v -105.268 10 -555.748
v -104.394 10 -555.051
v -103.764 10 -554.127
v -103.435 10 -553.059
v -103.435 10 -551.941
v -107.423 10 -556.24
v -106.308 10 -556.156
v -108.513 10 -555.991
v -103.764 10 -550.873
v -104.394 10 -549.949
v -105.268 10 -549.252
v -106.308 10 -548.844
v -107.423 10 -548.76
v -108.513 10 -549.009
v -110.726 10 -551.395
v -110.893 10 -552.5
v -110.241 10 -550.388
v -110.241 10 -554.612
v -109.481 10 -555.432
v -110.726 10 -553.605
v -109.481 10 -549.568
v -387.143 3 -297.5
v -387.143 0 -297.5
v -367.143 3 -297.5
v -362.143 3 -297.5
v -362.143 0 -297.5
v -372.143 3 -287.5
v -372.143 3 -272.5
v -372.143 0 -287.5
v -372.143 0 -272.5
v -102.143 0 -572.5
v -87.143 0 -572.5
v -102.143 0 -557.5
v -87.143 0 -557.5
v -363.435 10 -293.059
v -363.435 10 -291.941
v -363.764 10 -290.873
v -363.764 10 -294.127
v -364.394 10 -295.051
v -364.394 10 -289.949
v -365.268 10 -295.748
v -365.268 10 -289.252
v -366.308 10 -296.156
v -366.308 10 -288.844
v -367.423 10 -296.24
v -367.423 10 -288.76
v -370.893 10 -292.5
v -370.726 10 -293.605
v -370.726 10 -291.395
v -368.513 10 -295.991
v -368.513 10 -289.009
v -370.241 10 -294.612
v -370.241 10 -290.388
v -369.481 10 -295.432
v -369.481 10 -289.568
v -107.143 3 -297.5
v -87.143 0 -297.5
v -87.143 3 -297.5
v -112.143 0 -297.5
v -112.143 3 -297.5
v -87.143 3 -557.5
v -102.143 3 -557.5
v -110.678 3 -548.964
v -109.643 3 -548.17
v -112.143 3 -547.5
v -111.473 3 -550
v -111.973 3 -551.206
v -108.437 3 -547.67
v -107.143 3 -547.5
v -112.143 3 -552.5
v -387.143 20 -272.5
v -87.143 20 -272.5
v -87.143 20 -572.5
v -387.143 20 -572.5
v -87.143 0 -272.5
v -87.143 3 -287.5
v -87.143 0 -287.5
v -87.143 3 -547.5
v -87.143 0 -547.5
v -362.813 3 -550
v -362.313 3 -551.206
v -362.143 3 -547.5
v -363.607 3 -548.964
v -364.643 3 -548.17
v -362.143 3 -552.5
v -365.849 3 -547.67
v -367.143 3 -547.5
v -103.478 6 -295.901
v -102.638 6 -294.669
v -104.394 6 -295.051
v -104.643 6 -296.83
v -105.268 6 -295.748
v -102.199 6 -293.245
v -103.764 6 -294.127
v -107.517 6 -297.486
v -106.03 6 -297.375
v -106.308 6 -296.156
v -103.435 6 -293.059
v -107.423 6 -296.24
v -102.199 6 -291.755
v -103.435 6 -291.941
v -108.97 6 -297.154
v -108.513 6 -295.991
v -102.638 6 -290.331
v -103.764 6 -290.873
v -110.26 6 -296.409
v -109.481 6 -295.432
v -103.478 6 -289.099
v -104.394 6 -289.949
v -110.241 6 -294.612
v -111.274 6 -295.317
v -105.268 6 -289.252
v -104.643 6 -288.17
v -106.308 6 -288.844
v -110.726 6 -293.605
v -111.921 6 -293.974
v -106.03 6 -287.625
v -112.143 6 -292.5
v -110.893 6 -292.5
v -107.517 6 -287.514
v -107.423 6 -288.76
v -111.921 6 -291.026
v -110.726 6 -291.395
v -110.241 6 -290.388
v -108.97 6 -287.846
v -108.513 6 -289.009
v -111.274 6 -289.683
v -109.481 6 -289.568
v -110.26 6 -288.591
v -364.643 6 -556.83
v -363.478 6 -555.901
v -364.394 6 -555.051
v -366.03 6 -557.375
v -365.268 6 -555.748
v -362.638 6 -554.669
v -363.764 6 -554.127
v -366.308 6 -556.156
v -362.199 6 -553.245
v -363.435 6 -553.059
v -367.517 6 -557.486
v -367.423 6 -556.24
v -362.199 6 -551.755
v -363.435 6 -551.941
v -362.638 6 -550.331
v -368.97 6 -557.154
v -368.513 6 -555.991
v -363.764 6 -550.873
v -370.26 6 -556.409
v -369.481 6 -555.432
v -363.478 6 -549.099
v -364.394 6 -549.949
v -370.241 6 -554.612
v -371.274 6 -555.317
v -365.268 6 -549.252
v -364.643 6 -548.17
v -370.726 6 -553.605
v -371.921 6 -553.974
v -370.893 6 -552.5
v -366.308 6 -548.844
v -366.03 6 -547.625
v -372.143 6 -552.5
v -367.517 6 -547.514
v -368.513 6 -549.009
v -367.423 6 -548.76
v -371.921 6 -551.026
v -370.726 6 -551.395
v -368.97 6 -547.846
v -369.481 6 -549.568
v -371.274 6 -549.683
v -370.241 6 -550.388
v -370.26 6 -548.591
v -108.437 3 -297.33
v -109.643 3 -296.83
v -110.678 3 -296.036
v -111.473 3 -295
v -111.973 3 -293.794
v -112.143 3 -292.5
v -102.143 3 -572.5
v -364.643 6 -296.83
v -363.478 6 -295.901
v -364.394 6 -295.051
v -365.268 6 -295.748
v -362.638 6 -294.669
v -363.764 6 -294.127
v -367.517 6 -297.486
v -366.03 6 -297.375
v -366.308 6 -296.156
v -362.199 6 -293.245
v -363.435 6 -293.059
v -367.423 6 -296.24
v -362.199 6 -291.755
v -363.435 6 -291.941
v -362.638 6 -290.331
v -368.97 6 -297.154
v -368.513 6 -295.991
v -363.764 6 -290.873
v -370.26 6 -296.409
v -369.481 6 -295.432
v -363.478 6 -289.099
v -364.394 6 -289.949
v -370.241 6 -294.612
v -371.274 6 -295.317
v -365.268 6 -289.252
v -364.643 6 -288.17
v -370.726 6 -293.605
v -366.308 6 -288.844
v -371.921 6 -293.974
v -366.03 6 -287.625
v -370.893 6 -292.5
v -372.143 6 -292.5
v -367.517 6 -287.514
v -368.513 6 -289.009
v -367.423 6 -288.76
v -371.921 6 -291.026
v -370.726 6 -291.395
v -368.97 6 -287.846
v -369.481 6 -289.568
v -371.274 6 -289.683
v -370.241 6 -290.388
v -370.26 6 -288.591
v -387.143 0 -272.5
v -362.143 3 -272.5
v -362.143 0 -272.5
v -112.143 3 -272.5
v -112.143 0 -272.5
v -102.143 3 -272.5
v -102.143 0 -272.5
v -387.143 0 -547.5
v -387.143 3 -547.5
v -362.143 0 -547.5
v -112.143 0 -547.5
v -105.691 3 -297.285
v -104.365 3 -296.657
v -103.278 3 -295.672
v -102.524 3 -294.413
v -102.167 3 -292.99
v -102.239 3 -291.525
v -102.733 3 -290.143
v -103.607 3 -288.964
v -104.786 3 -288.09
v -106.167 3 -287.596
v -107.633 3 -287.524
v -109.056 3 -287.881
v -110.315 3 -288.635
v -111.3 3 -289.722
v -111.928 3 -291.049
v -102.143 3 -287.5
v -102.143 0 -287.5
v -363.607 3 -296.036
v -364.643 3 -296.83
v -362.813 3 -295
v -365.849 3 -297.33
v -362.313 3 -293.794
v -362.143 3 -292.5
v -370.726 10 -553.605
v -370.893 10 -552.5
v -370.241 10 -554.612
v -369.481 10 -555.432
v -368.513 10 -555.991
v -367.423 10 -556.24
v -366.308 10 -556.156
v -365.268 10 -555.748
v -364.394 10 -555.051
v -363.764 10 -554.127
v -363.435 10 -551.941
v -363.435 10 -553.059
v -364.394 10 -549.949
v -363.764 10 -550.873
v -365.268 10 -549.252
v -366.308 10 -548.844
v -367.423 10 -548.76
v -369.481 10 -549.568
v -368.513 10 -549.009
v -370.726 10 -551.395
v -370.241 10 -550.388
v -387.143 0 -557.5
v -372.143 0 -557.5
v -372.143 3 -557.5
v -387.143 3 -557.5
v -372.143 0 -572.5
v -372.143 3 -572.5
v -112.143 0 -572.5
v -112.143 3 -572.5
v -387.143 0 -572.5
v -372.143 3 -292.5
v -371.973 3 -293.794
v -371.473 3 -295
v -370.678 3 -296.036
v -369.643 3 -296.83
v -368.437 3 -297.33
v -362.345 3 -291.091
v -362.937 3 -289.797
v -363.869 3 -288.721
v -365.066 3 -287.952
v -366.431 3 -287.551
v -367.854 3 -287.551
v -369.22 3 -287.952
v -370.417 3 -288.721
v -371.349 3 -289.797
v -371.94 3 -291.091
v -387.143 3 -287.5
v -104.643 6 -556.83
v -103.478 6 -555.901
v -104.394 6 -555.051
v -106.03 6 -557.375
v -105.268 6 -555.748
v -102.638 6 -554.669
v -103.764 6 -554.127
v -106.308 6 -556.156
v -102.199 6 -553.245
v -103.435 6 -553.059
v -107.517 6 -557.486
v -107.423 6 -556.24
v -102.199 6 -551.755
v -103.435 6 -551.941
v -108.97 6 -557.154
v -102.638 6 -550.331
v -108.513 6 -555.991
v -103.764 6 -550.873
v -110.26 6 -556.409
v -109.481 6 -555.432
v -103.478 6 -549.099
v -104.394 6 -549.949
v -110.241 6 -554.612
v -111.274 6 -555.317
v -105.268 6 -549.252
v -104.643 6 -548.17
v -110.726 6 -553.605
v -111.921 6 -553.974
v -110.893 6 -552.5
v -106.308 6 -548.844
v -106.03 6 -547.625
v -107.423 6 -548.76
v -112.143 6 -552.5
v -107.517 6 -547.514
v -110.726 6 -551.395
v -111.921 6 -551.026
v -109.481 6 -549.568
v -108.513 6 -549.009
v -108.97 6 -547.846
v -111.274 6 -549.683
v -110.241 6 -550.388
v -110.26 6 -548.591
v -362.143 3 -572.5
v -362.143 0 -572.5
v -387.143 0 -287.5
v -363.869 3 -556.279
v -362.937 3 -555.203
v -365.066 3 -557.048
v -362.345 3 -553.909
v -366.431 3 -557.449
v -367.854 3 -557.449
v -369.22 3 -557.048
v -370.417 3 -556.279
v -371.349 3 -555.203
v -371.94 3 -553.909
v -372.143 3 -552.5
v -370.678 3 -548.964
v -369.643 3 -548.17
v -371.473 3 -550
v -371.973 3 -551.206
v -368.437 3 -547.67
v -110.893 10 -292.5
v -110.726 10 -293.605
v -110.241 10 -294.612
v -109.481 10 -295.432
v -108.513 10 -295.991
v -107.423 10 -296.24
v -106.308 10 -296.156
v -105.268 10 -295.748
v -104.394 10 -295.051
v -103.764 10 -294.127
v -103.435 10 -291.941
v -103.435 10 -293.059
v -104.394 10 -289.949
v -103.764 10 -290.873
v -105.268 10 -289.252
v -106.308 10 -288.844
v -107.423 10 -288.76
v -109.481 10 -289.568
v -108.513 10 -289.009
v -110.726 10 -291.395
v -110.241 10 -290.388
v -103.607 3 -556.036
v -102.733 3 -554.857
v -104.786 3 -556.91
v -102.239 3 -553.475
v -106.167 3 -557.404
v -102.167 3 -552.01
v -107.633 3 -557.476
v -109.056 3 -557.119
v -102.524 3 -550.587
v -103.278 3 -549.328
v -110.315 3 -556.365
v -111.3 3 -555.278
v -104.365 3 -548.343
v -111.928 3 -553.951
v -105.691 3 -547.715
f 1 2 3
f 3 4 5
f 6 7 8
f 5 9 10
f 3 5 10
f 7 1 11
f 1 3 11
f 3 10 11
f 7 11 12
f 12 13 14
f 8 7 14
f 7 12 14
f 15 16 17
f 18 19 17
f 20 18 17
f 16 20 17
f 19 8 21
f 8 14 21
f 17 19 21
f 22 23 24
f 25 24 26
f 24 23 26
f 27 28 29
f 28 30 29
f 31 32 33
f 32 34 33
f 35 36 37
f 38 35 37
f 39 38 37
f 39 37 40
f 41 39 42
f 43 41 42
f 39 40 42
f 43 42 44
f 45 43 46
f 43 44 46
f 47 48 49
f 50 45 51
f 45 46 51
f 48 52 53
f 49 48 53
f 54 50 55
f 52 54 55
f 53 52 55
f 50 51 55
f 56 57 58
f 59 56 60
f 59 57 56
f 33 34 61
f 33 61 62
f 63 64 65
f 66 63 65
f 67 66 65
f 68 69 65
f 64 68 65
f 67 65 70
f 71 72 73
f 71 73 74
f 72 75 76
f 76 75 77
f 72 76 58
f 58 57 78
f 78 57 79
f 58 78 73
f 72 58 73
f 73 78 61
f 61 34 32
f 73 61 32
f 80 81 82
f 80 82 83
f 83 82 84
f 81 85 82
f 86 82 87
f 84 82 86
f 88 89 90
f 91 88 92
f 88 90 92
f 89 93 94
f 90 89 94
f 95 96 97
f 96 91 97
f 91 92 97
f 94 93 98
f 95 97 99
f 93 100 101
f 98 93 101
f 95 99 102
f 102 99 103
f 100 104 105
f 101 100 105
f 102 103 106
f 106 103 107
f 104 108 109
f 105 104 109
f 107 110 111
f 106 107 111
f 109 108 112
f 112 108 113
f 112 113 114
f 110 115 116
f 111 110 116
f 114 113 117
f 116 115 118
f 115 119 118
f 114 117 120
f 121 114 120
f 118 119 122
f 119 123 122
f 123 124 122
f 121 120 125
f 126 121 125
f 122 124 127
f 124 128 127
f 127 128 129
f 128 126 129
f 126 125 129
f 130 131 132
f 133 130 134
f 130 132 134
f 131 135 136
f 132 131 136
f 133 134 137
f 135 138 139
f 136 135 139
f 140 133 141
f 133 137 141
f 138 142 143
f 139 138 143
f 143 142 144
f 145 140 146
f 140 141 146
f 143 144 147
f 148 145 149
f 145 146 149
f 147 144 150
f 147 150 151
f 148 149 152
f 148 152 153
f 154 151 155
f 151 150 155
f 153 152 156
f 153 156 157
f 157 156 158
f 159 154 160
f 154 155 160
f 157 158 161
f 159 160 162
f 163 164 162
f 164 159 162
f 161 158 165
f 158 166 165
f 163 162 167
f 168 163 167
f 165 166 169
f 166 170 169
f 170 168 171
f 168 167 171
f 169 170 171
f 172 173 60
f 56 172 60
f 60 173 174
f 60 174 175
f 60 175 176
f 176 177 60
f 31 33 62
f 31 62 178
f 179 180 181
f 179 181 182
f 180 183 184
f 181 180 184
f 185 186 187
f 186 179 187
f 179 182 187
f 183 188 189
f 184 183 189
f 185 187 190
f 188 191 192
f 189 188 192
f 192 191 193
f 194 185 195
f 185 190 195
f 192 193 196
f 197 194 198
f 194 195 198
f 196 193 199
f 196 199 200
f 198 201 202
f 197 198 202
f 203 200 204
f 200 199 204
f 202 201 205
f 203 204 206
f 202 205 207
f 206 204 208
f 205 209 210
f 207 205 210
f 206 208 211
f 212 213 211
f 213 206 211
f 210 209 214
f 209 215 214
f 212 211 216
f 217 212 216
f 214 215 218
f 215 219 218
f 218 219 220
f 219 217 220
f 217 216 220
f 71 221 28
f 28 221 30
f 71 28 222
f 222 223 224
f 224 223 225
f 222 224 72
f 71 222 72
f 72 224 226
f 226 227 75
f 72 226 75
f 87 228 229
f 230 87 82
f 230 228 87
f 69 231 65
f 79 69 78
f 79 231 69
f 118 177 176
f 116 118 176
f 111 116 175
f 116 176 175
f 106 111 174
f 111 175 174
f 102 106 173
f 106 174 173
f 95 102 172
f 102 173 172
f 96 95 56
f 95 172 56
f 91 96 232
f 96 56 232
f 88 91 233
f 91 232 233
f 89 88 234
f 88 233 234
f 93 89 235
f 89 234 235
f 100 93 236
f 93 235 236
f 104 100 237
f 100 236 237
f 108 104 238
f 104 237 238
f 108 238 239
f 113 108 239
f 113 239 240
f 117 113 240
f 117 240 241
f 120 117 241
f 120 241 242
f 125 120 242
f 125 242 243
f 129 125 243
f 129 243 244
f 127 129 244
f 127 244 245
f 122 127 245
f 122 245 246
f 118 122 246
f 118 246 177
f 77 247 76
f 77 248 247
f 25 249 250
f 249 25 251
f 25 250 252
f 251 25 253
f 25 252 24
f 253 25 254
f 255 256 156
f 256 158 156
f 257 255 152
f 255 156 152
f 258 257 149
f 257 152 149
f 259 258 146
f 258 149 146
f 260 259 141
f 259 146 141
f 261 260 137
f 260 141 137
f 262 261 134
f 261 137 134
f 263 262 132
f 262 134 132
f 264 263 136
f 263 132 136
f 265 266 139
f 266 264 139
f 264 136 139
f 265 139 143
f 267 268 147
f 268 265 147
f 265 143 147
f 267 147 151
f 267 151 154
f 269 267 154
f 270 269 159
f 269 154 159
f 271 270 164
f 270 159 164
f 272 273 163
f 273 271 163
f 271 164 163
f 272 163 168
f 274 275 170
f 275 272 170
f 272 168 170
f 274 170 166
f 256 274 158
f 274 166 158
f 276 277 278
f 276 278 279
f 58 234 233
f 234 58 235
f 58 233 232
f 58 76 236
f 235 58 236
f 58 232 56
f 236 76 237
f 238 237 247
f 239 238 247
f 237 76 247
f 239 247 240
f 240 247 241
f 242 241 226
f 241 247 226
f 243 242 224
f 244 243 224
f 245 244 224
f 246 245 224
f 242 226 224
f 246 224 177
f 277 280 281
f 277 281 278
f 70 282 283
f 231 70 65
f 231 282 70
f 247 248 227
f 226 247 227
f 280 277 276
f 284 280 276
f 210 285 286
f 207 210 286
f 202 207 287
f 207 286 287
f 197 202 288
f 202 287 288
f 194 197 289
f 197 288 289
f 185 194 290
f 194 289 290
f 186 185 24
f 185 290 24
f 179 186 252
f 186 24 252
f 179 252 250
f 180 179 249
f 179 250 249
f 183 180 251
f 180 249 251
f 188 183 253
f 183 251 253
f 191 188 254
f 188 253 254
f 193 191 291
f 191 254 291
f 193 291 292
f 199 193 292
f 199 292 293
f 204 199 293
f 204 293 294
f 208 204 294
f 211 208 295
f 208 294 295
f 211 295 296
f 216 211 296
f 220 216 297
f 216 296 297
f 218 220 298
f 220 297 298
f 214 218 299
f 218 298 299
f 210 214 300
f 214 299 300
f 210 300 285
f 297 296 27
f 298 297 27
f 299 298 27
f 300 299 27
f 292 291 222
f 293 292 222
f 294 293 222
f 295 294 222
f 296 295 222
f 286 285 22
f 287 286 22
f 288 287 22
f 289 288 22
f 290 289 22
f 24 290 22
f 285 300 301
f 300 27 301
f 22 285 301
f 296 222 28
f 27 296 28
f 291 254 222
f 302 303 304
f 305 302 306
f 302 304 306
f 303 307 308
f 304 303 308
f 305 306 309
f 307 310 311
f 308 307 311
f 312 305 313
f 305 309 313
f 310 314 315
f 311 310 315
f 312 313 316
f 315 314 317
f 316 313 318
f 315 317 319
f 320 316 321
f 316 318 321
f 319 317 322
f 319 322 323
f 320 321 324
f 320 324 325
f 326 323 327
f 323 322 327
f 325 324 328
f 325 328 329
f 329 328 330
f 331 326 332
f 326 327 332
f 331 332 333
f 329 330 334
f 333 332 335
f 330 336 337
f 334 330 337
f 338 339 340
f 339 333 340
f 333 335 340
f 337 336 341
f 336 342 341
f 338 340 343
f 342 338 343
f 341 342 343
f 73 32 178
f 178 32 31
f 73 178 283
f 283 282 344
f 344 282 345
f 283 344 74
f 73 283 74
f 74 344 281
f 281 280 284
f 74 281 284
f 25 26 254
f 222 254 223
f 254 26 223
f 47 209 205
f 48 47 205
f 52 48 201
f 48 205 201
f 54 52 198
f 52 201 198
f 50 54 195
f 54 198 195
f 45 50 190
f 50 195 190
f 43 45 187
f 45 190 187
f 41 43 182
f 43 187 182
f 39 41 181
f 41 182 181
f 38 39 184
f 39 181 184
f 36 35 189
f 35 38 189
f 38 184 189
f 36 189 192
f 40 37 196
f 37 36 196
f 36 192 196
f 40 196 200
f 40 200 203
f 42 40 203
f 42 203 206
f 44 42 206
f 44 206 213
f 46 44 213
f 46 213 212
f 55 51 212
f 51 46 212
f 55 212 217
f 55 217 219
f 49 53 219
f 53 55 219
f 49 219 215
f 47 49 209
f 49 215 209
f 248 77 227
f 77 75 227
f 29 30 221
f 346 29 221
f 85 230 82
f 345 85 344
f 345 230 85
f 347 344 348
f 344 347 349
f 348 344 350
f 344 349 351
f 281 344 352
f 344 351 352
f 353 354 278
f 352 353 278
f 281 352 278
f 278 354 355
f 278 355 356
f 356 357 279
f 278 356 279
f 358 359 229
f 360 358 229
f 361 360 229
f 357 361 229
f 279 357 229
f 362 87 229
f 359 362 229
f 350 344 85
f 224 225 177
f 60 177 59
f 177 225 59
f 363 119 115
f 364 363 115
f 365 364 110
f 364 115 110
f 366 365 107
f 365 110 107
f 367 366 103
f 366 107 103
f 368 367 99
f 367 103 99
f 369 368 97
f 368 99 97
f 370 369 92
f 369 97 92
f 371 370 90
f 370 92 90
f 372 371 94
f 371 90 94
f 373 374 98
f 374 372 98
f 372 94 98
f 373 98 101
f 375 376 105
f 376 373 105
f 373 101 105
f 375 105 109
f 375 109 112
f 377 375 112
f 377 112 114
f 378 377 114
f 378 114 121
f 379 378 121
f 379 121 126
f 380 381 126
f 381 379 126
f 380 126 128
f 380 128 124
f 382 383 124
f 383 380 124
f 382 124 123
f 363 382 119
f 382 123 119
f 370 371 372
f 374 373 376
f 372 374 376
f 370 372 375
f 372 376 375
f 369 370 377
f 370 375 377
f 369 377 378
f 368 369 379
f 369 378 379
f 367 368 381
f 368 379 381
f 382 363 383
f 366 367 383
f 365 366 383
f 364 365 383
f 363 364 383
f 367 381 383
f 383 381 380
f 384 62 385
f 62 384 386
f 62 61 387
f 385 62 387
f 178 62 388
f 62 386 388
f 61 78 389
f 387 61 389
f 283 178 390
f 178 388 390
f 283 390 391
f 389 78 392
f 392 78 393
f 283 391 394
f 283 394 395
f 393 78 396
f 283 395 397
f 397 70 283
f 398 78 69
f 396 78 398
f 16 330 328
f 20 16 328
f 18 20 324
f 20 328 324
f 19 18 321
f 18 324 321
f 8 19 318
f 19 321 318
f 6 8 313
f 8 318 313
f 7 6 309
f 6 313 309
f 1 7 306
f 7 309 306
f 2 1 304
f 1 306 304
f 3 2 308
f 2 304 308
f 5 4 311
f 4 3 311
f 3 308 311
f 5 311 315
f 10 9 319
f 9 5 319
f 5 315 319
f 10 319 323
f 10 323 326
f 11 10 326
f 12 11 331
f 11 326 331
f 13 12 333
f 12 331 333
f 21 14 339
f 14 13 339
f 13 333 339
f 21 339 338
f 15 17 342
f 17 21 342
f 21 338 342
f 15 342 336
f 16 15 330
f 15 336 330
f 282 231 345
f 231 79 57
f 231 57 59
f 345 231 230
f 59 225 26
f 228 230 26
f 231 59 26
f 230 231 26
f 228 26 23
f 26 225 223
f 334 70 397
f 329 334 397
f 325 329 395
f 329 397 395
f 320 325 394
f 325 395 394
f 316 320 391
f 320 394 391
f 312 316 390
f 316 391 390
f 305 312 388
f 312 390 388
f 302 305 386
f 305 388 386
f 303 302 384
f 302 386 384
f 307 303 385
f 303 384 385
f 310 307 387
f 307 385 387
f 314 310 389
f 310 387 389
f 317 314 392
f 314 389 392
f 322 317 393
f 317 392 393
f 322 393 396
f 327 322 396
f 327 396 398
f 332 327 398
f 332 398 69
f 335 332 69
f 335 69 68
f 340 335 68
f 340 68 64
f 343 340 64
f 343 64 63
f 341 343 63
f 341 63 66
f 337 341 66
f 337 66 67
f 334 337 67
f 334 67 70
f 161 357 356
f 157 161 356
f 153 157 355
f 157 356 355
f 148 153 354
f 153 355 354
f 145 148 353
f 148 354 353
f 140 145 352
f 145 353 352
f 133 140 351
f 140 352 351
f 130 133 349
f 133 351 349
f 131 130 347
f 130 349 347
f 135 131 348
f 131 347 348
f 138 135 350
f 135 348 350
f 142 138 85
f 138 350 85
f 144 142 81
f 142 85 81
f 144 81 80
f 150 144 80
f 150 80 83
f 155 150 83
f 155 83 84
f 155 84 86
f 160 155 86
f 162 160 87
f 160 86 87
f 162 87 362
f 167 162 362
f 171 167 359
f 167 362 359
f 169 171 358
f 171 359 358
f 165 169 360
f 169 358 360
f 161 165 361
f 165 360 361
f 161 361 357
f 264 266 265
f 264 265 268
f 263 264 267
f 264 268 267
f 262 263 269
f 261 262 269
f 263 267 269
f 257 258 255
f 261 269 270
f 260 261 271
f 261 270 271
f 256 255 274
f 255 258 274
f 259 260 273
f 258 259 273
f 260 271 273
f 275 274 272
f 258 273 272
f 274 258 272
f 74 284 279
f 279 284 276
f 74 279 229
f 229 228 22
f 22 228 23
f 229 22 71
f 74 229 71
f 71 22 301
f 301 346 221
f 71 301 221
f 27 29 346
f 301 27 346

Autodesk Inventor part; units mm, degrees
ref_plane "YZ Plane" through (0, 0, 0) normal (1, 0, 0) x (0, 1, 0)
ref_plane "XZ Plane" through (0, 0, 0) normal (0, 1, 0) x (-1, 0, 0)
ref_plane "XY Plane" through (0, 0, 0) normal (0, 0, 1) x (1, 0, 0)
sketch "Skizze1" plane through (0, 0, 0) normal (0, 1, 0) x (-1, 0, 0)
  line L0 (387.1429, -272.5) -> (87.1429, -272.5)
  line L1 (87.1429, -272.5) -> (87.1429, -572.5)
  line L2 (87.1429, -572.5) -> (387.1429, -572.5)
  line L3 (387.1429, -572.5) -> (387.1429, -272.5)
  circle A0 centre (107.1429, -292.5) radius 3.75
  circle A1 centre (367.1429, -292.5) radius 3.75
  circle A2 centre (367.1429, -552.5) radius 3.75
  circle A3 centre (107.1429, -552.5) radius 3.75
  line L4 (387.1429, -297.5) -> (362.1429, -297.5)
  line L5 (362.1429, -297.5) -> (362.1429, -287.5)
  line L6 (362.1429, -287.5) -> (387.1429, -287.5)
  line L7 (387.1429, -287.5) -> (387.1429, -297.5)
  line L8 (362.1429, -272.5) -> (372.1429, -272.5)
  line L9 (372.1429, -272.5) -> (372.1429, -297.5)
  line L10 (372.1429, -297.5) -> (362.1429, -297.5)
  line L11 (362.1429, -297.5) -> (362.1429, -272.5)
  line L12 (362.1429, -572.5) -> (372.1429, -572.5)
  line L13 (372.1429, -572.5) -> (372.1429, -547.5)
  line L14 (372.1429, -547.5) -> (362.1429, -547.5)
  line L15 (362.1429, -547.5) -> (362.1429, -572.5)
  line L16 (387.1429, -547.5) -> (362.1429, -547.5)
  line L17 (362.1429, -547.5) -> (362.1429, -557.5)
  line L18 (362.1429, -557.5) -> (387.1429, -557.5)
  line L19 (387.1429, -557.5) -> (387.1429, -547.5)
  line L20 (112.1429, -547.5) -> (87.1429, -547.5)
  line L21 (87.1429, -547.5) -> (87.1429, -557.5)
  line L22 (87.1429, -557.5) -> (112.1429, -557.5)
  line L23 (112.1429, -557.5) -> (112.1429, -547.5)
  line L24 (112.1429, -547.5) -> (102.1429, -547.5)
  line L25 (102.1429, -547.5) -> (102.1429, -572.5)
  line L26 (102.1429, -572.5) -> (112.1429, -572.5)
  line L27 (112.1429, -572.5) -> (112.1429, -547.5)
  line L28 (112.1429, -287.5) -> (87.1429, -287.5)
  line L29 (87.1429, -287.5) -> (87.1429, -297.5)
  line L30 (87.1429, -297.5) -> (112.1429, -297.5)
  line L31 (112.1429, -297.5) -> (112.1429, -287.5)
  line L32 (112.1429, -297.5) -> (102.1429, -297.5)
  line L33 (102.1429, -297.5) -> (102.1429, -272.5)
  line L34 (102.1429, -272.5) -> (112.1429, -272.5)
  line L35 (112.1429, -272.5) -> (112.1429, -297.5)
  circle A4 centre (367.1429, -552.5) radius 5
  circle A5 centre (107.1429, -552.5) radius 5
  circle A6 centre (107.1429, -292.5) radius 5
  circle A7 centre (367.1429, -292.5) radius 5
  point P0 (0, 0)
  dimension "d0" = 300
  dimension "d1" = 300
  dimension "d2" = 7.5
  dimension "d3" = 7.5
  dimension "d4" = 7.5
  dimension "d5" = 7.5
  dimension "d6" = 20
  dimension "d7" = 20
  dimension "d8" = 20
  dimension "d9" = 20
  dimension "d10" = 20
  dimension "d12" = 20
  dimension "d13" = 20
  dimension "d23" = 10
  dimension "d24" = 10
  dimension "d25" = 25
  dimension "d26" = 25
  dimension "d27" = 25
  dimension "d28" = 25
  dimension "d29" = 25
  dimension "d30" = 25
  dimension "d31" = 10
  dimension "d32" = 10
  dimension "d33" = 10
  dimension "d34" = 10
  dimension "d35" = 10
  dimension "d36" = 10
  dimension "d37" = 10
  dimension "d38" = 10
extrude "Extrusion1" add sketch "Skizze1" along normal blind 20 contours L3 L6 L9 L0 | L9 L6 L11 L0 | L3 L4 L9 L6 | L11 L5 L4 L3 L16 L14 L15 L2 L27 L23 L20 L1 L30 L31 L35 L0 | L9 A7 L6 | L35 L28 L33 L0 | L6 A7 L5 | A7 | L9 L4 A7 | L3 L18 L13 L16 | L33 L28 L1 L0 | L31 A6 L28 | A7 L4 L5 | L3 L2 L13 L18 | L13 A4 L14 | L33 L30 L1 L28 | L28 A6 L33 | A6 | L31 L30 A6 | L18 A4 L13 | L13 L2 L15 L18 | A4 | A4 L15 L14 | A6 L30 L33 | L18 L15 A4 | L20 L25 L22 L1 | L2 L25 L22 L27 | L22 L25 L2 L1 | L20 A5 L25 | L22 A5 L23 | L25 A5 L22 | L20 L23 A5 | A5 | A0 | A1 | A2 | A3
extrude "Extrusion2" cut sketch "Skizze1" along normal blind 3 contours L9 L6 L11 L0 | L3 L4 L9 L6 | L9 A7 L6 | L35 L28 L33 L0 | L6 A7 L5 | A7 | L9 L4 A7 | L3 L18 L13 L16 | L31 A6 L28 | A7 L4 L5 | L13 A4 L14 | L33 L30 L1 L28 | L28 A6 L33 | A6 | L31 L30 A6 | L18 A4 L13 | L13 L2 L15 L18 | A4 | A4 L15 L14 | A6 L30 L33 | L18 L15 A4 | L20 L25 L22 L1 | L2 L25 L22 L27 | L20 A5 L25 | L22 A5 L23 | L25 A5 L22 | L20 L23 A5 | A5 | A0 | A1 | A2 | A3
extrude "Extrusion3" cut sketch "Skizze1" along normal blind 10 contours A0 | A1 | A2 | A3
extrude "Extrusion4" cut sketch "Skizze1" along normal blind 6 contours A7 | A6 | A4 | A5
properties material "Holz (Kirsche)"
